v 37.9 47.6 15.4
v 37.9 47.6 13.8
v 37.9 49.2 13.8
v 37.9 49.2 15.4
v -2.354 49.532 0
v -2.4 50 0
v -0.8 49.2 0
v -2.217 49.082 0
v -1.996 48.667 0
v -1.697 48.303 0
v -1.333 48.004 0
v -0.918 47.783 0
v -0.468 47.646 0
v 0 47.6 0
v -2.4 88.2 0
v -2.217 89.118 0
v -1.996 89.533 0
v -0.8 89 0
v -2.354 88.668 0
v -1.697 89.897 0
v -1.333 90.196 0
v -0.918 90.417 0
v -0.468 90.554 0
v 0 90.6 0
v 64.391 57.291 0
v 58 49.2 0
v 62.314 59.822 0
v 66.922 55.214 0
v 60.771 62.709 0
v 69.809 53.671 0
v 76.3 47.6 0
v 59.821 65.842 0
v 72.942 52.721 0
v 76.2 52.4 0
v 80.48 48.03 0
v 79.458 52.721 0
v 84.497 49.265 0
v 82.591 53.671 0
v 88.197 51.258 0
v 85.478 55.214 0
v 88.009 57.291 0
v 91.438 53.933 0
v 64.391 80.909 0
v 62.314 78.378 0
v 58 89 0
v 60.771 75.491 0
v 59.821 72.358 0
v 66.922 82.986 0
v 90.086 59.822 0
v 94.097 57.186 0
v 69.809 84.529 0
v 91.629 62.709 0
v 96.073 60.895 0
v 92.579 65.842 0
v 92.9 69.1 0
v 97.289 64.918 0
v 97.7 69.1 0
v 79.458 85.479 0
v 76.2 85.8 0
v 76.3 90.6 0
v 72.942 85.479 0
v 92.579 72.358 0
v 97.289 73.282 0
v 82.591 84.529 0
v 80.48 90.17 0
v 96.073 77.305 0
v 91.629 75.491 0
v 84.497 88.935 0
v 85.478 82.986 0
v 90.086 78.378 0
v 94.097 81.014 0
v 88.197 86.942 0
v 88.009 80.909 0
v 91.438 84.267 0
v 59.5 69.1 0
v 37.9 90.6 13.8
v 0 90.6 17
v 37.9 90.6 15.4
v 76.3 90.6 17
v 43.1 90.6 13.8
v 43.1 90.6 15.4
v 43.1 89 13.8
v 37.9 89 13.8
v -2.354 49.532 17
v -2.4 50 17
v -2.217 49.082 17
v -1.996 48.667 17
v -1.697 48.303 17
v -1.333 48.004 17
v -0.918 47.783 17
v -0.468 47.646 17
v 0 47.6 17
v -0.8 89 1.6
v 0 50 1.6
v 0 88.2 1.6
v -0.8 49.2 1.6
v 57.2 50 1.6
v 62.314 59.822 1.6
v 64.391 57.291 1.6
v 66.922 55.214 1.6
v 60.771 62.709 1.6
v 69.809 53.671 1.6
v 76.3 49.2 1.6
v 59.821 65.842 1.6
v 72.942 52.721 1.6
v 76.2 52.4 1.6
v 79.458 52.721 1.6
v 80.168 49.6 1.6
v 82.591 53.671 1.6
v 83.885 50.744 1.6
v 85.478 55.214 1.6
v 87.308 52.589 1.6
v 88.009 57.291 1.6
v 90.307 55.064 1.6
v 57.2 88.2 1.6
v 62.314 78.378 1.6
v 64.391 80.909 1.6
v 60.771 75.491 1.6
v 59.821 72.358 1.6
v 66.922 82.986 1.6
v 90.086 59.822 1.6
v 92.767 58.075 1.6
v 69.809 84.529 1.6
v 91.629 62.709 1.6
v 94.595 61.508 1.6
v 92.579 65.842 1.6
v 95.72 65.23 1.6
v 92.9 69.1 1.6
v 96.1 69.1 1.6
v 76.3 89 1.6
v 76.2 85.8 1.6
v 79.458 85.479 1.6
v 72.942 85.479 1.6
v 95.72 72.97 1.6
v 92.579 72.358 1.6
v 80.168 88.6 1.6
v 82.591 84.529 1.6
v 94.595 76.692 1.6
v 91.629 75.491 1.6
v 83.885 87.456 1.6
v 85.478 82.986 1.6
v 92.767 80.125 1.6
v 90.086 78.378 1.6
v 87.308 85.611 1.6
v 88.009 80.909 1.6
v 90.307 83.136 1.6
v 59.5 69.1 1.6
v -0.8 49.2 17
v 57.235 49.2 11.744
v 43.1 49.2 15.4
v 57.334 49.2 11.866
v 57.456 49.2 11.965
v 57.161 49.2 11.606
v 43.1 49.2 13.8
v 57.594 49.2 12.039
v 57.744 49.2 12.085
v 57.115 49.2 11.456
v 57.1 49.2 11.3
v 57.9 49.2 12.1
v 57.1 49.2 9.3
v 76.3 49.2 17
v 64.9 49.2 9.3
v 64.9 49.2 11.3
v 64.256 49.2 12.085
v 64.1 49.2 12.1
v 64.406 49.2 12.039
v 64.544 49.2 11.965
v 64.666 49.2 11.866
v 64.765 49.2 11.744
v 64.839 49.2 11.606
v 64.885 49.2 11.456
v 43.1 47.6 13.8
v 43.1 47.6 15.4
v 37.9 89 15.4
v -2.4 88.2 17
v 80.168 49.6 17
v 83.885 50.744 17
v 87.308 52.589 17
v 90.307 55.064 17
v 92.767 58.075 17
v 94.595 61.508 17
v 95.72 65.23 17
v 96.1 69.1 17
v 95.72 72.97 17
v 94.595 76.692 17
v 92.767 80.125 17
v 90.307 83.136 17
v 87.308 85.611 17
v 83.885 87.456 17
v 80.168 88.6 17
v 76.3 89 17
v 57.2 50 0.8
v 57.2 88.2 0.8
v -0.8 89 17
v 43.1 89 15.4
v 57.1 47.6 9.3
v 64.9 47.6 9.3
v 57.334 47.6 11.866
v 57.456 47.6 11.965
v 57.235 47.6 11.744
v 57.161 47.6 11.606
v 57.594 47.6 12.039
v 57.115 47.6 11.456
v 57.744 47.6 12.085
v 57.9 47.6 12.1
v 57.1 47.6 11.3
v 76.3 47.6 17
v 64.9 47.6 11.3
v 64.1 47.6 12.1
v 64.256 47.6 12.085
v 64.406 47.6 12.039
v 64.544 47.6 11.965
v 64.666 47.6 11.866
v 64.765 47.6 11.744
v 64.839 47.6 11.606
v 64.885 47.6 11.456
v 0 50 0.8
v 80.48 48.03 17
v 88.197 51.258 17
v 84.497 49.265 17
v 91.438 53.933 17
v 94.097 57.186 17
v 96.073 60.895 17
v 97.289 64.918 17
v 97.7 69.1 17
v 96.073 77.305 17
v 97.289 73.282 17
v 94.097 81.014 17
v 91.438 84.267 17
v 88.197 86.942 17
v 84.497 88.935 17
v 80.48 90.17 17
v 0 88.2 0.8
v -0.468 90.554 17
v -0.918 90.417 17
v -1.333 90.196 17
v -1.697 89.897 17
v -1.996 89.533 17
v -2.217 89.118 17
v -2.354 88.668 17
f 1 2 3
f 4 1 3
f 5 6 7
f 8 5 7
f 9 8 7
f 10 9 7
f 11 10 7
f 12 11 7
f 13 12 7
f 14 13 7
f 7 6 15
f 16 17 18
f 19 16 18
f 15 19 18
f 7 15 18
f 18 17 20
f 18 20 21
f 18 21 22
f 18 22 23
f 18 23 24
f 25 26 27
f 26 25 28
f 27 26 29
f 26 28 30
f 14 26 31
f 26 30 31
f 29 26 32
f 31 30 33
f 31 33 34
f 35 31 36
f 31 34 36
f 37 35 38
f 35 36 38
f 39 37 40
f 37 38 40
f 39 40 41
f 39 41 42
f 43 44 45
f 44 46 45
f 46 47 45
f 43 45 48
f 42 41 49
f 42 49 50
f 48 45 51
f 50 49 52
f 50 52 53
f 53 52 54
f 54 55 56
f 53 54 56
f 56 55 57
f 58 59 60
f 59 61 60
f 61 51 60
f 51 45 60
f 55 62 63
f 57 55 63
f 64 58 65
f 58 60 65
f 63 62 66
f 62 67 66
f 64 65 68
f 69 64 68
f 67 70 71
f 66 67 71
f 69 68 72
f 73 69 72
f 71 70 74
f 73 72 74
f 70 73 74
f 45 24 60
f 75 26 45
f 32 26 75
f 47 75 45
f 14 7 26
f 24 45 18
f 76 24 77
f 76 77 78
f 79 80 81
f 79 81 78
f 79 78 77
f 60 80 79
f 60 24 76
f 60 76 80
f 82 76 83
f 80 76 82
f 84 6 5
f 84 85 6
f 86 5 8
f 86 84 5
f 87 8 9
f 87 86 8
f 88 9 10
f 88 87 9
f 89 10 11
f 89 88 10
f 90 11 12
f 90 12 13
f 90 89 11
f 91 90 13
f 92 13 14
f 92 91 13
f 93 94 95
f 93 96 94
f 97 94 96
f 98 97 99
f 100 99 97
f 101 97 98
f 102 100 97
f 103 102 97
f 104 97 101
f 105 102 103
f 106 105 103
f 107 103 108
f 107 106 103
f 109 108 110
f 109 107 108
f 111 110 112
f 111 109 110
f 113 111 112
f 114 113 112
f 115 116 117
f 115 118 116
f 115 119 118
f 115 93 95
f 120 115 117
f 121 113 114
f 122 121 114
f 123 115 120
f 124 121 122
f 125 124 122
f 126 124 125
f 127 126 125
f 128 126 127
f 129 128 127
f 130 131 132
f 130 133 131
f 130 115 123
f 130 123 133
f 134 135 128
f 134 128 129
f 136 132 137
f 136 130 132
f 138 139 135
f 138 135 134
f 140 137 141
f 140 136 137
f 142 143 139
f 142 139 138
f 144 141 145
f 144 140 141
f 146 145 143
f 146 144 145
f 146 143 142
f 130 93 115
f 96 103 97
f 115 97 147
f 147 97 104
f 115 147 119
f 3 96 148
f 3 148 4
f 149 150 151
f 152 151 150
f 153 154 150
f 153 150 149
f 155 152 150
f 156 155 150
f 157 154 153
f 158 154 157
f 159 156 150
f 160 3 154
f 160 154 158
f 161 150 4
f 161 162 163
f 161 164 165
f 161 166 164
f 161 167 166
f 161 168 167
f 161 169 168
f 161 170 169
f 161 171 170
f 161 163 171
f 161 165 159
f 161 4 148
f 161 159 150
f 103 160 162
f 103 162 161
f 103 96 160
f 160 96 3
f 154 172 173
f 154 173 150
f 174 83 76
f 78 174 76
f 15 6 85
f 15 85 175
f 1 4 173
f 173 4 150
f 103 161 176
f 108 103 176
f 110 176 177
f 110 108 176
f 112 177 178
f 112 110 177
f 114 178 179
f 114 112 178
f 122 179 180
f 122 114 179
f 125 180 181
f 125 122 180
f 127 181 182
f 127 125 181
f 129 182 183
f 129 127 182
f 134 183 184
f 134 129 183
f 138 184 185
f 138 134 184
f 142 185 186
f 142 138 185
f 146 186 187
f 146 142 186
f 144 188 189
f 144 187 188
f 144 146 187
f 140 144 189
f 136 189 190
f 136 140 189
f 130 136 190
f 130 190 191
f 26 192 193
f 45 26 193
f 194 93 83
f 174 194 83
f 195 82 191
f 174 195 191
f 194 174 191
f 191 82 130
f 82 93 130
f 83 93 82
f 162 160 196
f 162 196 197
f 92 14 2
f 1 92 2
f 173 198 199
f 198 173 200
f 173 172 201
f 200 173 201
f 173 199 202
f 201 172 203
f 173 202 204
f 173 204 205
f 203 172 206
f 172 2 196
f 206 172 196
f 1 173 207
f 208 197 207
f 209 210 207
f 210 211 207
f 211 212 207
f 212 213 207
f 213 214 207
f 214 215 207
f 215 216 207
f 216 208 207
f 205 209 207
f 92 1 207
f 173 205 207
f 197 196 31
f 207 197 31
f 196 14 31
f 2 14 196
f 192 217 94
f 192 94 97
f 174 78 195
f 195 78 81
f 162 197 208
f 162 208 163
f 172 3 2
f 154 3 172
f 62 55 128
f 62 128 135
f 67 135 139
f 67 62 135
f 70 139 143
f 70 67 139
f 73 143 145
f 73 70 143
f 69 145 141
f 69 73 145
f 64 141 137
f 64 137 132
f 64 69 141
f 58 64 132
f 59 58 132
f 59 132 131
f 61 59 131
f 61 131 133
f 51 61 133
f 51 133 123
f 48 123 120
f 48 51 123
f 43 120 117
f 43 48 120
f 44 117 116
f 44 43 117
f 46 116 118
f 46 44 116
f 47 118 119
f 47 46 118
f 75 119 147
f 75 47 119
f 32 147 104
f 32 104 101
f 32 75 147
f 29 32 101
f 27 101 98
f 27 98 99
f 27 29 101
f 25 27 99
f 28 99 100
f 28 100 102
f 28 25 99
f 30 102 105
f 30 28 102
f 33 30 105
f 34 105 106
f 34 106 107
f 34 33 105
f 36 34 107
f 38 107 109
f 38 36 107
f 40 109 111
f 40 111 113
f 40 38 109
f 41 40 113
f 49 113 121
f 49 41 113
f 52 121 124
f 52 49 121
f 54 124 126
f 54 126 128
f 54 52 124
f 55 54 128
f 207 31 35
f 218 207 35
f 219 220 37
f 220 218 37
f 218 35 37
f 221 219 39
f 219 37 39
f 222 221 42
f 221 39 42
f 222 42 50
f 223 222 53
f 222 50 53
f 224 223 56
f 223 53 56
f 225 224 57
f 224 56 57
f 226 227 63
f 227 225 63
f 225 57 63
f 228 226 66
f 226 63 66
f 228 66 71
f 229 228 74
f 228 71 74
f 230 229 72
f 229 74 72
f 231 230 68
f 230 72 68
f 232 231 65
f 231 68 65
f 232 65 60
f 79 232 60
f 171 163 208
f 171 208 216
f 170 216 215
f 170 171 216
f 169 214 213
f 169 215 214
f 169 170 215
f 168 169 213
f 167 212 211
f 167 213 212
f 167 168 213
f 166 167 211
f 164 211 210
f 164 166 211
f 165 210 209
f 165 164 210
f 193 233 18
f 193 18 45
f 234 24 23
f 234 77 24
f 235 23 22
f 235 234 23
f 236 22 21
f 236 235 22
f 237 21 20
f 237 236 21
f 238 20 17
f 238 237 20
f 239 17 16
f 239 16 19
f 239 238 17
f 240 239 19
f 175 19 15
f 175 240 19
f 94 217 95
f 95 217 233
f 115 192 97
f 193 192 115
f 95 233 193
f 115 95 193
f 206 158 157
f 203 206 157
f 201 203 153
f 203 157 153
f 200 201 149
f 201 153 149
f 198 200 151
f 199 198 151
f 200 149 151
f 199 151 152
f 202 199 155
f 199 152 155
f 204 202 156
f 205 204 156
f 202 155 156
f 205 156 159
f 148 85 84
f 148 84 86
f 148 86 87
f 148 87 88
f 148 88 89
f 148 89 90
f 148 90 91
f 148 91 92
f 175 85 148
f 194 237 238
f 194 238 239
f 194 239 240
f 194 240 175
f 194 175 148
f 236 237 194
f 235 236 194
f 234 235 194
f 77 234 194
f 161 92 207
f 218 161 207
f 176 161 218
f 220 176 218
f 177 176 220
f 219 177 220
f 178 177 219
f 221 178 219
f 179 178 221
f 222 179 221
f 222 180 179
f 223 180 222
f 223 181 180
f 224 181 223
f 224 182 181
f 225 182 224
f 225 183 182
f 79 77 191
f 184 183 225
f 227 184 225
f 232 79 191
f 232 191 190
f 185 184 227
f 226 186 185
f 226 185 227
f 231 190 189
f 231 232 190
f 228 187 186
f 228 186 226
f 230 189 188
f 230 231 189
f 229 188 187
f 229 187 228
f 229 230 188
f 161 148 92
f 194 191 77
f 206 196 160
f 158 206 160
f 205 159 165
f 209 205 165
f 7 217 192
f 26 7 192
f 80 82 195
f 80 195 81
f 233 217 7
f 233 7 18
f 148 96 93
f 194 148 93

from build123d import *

# Parameters (mm, degrees)
BOX011_W          = 7.8
BOX011_H          = 10
BOX011_DEPTH      = 2.8
FILLET003_R       = 0.8
BOX010_W          = 5.2
BOX010_H          = 50
BOX010_DEPTH      = 1.6
BOX008_W          = 57.2
BOX008_H          = 38.2
BOX008_DEPTH      = 1.6
CYLINDER012_R     = 16.7
CYLINDER012_DEPTH = 1.6
CYLINDER011_R     = 19.9
CYLINDER011_DEPTH = 17
BOX007_W          = 77.1
BOX007_H          = 39.8
BOX007_DEPTH      = 17
CYLINDER010_R     = 21.5
CYLINDER010_DEPTH = 17
BOX006_W          = 78.7
BOX006_H          = 43
BOX006_DEPTH      = 17
FILLET002_R       = 2.4
CHAMFER005_SIZE   = 0.8


with BuildPart() as usb:
    # Box011 → Box011 (new body)
    with BuildSketch(Plane(origin=(57.1, 45, 9.3), x_dir=(1, 0, 0), z_dir=(0, 0, 1))):
        with Locations((3.9, 5)):
            Rectangle(BOX011_W, BOX011_H)
    extrude(amount=BOX011_DEPTH)

    # Fillet003
    fillet003_edges = [usb.edges().sort_by_distance(p)[0] for p in [
        (57.1, 50, 12.1),
        (64.9, 50, 12.1),
    ]]
    fillet(fillet003_edges, radius=FILLET003_R)


with BuildPart() as w_rfel010:
    # Box010 → Box010 (new body)
    with BuildSketch(Plane(origin=(37.9, 45, 13.8), x_dir=(1, 0, 0), z_dir=(0, 0, 1))):
        with Locations((2.6, 25)):
            Rectangle(BOX010_W, BOX010_H)
    extrude(amount=BOX010_DEPTH)


with BuildPart() as w_rfel008:
    # Box008 → Box008 (new body)
    with BuildSketch(Plane(origin=(0, 50, 0), x_dir=(1, 0, 0), z_dir=(0, 0, 1))):
        with Locations((28.6, 19.1)):
            Rectangle(BOX008_W, BOX008_H)
    extrude(amount=BOX008_DEPTH)


with BuildPart() as zylinder012:
    # Cylinder012 → Cylinder012 (new body)
    with BuildSketch(Plane(origin=(76.2, 69.1, 0), x_dir=(1, 0, 0), z_dir=(0, 0, 1))):
        Circle(CYLINDER012_R)
    extrude(amount=CYLINDER012_DEPTH)


with BuildPart() as zylinder011:
    # Cylinder011 → Cylinder011 (new body)
    with BuildSketch(Plane(origin=(76.2, 69.1, 1.6), x_dir=(1, 0, 0), z_dir=(0, 0, 1))):
        Circle(CYLINDER011_R)
    extrude(amount=CYLINDER011_DEPTH)


with BuildPart() as fusion009:
    # Box007 → Box007 (new body)
    with BuildSketch(Plane(origin=(-0.8, 49.2, 1.6), x_dir=(1, 0, 0), z_dir=(0, 0, 1))):
        with Locations((38.55, 19.9)):
            Rectangle(BOX007_W, BOX007_H)
    extrude(amount=BOX007_DEPTH)

    # Fusion009: union Zylinder011
    add(zylinder011.part)


with BuildPart() as zylinder010:
    # Cylinder010 → Cylinder010 (new body)
    with BuildSketch(Plane(origin=(76.2, 69.1, 0), x_dir=(1, 0, 0), z_dir=(0, 0, 1))):
        Circle(CYLINDER010_R)
    extrude(amount=CYLINDER010_DEPTH)


with BuildPart() as top:
    # Box006 → Box006 (new body)
    with BuildSketch(Plane(origin=(-2.4, 47.6, 0), x_dir=(1, 0, 0), z_dir=(0, 0, 1))):
        with Locations((39.35, 21.5)):
            Rectangle(BOX006_W, BOX006_H)
    extrude(amount=BOX006_DEPTH)

    # Fusion008: union Zylinder010
    add(zylinder010.part)

    # Cut004: cut Fusion009
    add(fusion009.part, mode=Mode.SUBTRACT)

    # Fillet002
    fillet002_edges = [top.edges().sort_by_distance(p)[0] for p in [
        (-2.4, 47.6, 8.5),
        (-2.4, 90.6, 8.5),
    ]]
    fillet(fillet002_edges, radius=FILLET002_R)

    # Cut005: cut Zylinder012
    add(zylinder012.part, mode=Mode.SUBTRACT)

    # Cut006: cut Würfel008
    add(w_rfel008.part, mode=Mode.SUBTRACT)

    # Chamfer005
    chamfer005_edges = [top.edges().sort_by_distance(p)[0] for p in [
        (57.2, 83.681153, 0),
        (28.6, 88.2, 0),
        (0, 69.1, 0),
        (28.6, 50, 0),
        (57.2, 54.518847, 0),
        (57.2, 69.1, 0),
    ]]
    chamfer(chamfer005_edges, length=CHAMFER005_SIZE)

    # Cut011: cut Würfel010
    add(w_rfel010.part, mode=Mode.SUBTRACT)

    # Cut012: cut USB
    add(usb.part, mode=Mode.SUBTRACT)


solid = top.part
